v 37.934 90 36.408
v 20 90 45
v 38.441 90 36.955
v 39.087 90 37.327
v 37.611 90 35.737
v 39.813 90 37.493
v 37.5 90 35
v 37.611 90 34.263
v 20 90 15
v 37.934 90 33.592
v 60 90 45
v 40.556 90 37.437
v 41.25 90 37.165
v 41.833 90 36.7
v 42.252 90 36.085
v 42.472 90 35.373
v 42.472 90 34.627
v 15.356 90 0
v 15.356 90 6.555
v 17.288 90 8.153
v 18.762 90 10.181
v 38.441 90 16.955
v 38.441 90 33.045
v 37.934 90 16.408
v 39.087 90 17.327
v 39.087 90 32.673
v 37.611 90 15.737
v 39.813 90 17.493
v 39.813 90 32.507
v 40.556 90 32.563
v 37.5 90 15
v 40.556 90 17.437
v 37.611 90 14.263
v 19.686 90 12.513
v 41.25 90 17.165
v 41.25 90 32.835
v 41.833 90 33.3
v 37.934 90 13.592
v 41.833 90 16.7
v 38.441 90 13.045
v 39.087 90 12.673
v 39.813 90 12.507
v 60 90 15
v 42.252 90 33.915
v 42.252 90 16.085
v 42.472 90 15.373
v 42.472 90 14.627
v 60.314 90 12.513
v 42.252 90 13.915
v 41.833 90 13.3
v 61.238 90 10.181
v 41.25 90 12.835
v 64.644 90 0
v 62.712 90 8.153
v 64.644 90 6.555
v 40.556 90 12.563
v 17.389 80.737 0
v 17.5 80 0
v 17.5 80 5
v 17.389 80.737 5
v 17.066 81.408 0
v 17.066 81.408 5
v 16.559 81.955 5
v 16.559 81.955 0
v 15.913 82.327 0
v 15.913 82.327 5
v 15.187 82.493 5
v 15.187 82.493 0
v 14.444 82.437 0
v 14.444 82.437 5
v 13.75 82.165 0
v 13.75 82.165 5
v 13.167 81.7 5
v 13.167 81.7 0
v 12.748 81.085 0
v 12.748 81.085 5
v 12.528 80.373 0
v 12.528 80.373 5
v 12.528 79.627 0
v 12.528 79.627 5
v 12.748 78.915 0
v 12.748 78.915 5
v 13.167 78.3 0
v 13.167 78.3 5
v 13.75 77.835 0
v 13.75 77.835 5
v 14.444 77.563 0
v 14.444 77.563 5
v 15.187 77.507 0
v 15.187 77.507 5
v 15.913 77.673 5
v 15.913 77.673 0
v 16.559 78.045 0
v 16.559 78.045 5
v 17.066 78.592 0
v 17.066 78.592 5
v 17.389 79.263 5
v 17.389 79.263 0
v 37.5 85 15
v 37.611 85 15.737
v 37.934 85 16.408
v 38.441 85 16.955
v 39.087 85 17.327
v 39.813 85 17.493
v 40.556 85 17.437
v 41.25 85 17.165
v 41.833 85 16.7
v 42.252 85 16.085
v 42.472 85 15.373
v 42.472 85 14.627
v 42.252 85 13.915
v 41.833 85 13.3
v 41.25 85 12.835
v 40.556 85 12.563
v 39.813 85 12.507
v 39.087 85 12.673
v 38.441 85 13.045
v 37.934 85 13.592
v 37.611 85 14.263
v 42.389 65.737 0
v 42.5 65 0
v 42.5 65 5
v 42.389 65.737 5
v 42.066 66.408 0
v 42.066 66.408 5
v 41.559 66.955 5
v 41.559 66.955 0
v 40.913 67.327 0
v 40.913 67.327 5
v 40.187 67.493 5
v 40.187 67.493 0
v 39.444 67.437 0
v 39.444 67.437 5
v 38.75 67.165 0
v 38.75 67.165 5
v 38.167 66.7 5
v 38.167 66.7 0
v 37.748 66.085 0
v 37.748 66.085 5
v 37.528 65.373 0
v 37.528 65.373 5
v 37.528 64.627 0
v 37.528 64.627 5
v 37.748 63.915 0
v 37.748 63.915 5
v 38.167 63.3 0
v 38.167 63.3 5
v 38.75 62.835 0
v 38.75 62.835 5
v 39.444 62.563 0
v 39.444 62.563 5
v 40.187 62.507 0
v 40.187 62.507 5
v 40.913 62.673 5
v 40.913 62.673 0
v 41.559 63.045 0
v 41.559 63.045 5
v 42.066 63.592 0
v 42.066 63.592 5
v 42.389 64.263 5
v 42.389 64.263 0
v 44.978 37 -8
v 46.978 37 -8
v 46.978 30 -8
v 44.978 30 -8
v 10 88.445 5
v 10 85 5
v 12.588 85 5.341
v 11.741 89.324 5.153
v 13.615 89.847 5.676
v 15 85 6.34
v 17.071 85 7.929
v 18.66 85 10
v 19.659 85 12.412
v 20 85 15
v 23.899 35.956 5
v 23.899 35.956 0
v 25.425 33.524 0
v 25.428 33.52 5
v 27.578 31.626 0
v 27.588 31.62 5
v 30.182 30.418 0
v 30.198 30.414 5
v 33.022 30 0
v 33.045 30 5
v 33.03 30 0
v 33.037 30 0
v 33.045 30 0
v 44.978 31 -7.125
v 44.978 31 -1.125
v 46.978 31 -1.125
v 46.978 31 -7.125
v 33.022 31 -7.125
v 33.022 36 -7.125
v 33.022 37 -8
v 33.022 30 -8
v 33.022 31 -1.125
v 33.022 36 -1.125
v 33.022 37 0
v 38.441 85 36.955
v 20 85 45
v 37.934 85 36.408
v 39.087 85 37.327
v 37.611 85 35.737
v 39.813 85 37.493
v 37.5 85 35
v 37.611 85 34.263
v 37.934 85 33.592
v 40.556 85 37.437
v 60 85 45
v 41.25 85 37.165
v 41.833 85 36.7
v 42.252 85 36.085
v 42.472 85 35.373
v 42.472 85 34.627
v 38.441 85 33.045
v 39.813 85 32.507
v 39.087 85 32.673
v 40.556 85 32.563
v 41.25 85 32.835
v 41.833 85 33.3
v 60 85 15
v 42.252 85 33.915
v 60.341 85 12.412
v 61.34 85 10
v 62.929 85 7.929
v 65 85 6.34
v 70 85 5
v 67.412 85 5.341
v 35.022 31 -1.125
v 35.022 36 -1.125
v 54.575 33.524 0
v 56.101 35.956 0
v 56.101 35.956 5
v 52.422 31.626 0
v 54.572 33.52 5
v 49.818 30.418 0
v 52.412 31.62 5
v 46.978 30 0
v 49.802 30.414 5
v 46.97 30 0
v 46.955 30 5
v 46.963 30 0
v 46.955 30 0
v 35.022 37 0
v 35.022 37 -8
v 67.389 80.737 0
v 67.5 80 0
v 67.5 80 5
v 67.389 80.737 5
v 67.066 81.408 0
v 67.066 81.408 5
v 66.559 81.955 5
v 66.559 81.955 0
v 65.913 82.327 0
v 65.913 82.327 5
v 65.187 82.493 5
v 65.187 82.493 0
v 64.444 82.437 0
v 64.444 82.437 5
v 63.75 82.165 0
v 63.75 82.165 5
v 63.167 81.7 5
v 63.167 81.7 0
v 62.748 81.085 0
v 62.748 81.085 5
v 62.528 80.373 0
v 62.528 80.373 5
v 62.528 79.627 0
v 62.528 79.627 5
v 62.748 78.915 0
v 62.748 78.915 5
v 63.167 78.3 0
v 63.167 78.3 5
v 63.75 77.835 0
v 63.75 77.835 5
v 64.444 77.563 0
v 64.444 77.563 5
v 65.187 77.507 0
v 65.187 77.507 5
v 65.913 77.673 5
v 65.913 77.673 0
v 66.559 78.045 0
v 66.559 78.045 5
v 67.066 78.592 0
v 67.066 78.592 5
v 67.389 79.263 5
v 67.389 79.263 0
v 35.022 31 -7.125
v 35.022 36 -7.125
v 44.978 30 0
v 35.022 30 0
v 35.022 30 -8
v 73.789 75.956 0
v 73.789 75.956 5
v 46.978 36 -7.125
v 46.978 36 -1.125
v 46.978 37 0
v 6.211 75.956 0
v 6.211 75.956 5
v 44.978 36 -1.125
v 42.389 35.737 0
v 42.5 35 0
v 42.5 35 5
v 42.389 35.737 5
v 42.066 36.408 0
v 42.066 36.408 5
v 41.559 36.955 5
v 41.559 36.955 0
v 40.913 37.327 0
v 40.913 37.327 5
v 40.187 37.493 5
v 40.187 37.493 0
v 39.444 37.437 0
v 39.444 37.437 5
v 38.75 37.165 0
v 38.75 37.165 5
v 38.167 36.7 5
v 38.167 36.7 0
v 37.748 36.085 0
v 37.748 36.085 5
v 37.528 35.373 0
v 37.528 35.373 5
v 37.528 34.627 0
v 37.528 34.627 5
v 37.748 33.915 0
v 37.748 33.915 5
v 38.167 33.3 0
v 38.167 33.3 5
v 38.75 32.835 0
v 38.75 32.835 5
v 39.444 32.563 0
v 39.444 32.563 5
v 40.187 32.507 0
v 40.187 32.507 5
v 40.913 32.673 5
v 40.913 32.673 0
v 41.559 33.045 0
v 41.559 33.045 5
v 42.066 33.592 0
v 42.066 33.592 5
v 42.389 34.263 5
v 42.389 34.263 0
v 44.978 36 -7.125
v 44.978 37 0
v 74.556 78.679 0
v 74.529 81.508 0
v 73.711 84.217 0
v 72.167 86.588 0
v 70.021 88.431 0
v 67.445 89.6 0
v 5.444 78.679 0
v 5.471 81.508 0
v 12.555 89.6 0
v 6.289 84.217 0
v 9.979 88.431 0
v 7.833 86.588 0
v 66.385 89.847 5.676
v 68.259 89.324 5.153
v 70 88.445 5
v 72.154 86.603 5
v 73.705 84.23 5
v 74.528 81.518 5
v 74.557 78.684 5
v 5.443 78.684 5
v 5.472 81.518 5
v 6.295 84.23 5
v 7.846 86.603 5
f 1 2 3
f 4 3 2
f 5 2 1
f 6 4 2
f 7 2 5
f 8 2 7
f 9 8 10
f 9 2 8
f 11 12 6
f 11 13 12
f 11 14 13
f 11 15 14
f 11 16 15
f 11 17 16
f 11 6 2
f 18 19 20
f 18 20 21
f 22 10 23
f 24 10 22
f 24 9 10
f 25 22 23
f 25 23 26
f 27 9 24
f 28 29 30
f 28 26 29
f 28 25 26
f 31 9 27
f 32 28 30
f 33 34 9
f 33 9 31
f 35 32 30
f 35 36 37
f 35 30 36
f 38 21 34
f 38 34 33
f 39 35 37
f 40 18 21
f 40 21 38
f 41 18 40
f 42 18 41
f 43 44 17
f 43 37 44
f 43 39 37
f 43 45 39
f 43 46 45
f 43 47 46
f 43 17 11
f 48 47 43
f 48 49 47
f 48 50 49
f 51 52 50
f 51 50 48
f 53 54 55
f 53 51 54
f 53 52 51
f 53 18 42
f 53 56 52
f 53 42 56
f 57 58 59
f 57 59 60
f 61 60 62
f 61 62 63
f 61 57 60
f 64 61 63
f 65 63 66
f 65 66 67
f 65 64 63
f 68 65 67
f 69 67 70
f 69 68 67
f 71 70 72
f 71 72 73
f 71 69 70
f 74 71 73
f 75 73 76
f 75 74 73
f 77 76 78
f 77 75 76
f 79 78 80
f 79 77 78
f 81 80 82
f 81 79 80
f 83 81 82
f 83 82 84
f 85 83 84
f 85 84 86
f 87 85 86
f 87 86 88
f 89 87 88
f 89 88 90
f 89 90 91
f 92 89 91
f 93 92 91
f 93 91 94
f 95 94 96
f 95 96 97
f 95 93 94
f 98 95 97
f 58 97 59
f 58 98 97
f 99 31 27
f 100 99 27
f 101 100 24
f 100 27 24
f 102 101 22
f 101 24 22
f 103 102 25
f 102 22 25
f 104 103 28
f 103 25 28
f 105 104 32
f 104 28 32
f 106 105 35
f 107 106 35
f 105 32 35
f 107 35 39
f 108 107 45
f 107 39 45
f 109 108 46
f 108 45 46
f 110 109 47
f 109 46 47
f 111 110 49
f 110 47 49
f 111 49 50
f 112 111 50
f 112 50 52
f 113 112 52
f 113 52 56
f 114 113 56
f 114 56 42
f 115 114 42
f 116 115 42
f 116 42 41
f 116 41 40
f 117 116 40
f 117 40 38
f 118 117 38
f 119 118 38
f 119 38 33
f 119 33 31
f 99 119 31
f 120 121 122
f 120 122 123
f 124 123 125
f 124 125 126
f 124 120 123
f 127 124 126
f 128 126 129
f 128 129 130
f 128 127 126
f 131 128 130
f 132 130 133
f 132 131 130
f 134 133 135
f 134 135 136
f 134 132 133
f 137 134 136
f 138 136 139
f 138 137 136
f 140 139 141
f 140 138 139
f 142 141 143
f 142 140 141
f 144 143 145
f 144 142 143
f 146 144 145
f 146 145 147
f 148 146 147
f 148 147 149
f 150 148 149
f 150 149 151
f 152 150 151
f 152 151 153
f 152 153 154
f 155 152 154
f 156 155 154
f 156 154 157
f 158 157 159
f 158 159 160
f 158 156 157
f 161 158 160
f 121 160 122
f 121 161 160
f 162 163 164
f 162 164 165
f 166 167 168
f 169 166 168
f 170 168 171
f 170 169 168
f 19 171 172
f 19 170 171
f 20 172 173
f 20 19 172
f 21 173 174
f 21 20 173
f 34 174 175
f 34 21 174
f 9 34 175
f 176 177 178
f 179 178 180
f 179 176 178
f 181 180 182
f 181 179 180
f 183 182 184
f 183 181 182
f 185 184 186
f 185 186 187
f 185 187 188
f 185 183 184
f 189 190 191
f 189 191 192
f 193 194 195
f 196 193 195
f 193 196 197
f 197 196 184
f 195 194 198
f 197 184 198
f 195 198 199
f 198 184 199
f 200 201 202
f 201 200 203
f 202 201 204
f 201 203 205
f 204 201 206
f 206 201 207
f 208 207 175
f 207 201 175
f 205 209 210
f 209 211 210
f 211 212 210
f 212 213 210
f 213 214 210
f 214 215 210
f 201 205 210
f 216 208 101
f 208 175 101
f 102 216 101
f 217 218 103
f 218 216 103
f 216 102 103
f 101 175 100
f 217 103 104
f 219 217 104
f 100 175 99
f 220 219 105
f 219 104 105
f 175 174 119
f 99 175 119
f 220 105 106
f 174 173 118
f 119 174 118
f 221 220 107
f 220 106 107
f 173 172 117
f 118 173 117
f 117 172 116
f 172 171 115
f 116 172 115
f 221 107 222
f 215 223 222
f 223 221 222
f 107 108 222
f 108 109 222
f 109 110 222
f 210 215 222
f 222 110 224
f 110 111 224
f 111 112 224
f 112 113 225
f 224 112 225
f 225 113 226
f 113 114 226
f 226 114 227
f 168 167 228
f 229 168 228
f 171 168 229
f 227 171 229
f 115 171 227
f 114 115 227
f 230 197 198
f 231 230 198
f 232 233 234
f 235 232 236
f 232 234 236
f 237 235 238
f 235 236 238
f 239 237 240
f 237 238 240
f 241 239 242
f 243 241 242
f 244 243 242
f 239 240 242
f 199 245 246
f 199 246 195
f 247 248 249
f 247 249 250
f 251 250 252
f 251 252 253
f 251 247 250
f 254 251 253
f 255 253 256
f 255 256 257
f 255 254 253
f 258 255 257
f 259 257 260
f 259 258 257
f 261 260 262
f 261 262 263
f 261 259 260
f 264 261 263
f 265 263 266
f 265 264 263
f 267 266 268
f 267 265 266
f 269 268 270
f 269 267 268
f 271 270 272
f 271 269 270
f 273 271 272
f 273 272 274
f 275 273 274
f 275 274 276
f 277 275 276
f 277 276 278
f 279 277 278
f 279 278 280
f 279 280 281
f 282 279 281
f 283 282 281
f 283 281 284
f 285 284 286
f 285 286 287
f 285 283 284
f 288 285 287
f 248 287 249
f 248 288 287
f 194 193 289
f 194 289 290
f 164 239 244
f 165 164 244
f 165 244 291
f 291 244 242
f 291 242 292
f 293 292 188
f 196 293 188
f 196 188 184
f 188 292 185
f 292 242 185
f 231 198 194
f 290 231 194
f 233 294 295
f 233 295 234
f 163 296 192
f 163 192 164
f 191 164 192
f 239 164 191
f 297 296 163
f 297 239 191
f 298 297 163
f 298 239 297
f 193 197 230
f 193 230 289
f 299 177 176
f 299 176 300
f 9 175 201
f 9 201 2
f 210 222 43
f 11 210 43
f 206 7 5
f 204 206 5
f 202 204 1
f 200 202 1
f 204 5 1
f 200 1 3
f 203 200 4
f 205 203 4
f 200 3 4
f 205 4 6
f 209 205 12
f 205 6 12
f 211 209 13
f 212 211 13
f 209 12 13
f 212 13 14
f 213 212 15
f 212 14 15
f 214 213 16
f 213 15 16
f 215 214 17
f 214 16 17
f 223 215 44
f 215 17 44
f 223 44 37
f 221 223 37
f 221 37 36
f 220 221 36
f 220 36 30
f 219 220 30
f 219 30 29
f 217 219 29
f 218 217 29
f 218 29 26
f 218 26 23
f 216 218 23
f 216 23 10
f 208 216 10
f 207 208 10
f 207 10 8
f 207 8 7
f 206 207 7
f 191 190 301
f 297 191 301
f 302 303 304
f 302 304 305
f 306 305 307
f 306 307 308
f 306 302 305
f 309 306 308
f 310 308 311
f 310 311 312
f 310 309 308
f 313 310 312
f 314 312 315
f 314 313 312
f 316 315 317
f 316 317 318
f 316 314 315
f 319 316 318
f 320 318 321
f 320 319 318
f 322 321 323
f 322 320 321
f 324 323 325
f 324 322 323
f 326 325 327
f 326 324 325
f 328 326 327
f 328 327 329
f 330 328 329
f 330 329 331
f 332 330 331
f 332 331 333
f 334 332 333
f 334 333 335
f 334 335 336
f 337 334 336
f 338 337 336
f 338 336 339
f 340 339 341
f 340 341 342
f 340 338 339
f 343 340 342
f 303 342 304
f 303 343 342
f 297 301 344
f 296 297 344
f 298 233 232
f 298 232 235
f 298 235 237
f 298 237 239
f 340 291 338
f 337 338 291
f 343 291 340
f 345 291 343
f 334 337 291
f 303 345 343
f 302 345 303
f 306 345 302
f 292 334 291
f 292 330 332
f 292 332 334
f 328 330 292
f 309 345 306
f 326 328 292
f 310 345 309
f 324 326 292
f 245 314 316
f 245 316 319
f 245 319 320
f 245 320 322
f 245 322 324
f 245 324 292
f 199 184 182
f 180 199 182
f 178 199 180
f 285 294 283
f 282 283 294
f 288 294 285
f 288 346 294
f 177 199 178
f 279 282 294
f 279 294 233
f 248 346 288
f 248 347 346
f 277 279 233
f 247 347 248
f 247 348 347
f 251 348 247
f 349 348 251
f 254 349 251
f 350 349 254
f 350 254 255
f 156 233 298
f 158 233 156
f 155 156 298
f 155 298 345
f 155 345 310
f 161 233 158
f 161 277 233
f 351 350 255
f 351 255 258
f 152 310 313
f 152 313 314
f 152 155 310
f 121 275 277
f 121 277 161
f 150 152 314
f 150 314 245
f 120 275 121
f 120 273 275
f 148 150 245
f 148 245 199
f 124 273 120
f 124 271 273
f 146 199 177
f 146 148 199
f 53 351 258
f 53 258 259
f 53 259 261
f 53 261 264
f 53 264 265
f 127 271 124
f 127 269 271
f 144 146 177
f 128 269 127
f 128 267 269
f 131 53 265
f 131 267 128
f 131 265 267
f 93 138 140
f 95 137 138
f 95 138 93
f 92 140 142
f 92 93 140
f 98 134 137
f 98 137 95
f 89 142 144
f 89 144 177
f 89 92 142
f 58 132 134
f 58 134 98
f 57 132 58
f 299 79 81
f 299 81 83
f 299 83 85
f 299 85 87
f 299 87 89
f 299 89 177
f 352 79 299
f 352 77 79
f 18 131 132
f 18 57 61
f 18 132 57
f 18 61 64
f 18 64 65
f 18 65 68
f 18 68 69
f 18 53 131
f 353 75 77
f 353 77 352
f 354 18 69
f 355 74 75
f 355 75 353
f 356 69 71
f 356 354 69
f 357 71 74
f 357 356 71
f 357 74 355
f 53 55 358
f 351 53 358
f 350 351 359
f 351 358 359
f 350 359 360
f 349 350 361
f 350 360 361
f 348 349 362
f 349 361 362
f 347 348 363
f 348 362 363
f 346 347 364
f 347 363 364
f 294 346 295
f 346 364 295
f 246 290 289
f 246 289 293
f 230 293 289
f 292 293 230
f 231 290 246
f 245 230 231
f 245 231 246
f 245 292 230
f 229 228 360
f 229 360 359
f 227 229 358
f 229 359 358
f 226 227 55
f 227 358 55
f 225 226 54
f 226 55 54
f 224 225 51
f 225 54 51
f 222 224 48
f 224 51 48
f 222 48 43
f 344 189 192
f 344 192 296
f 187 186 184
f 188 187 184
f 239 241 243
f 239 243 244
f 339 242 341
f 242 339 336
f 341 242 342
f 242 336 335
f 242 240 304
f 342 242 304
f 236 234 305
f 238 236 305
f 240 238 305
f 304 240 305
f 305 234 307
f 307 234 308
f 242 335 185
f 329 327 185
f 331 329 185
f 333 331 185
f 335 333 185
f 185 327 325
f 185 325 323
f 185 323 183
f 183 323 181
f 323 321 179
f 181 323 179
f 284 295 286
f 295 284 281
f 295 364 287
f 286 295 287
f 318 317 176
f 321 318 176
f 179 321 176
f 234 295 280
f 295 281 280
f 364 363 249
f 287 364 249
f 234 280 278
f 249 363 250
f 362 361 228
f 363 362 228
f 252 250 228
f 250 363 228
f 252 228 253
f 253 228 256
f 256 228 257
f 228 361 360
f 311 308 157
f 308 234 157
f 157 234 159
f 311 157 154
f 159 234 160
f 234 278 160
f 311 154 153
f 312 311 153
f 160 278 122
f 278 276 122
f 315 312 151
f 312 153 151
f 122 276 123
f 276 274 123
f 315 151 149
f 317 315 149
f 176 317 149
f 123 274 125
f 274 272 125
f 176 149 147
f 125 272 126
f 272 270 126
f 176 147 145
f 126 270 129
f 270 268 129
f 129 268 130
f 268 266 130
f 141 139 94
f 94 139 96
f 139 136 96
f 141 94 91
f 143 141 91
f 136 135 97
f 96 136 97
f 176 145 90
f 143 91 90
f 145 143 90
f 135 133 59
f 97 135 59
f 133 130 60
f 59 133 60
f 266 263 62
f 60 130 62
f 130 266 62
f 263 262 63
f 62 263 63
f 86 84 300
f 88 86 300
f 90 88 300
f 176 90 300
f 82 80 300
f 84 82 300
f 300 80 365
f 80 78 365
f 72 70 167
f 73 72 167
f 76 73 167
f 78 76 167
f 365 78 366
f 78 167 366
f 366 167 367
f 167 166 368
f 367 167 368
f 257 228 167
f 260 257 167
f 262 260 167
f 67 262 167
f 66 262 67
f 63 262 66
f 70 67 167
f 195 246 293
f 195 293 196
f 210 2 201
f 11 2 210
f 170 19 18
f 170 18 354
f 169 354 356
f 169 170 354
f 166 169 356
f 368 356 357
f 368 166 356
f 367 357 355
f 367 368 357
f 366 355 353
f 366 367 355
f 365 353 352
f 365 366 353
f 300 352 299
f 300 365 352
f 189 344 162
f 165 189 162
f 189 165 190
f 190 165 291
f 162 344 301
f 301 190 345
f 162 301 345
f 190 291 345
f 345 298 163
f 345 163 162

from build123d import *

# Parameters (mm, degrees)
SKETCH1_R               = 2.5
BOSS_EXTRUDE1_DEPTH     = 5
FILLET1_R               = 10
SKETCH2_W               = 40
SKETCH2_H               = 5
BOSS_EXTRUDE2_DEPTH     = 40
SKETCH3_R               = 2.5
CUT_EXTRUDE1_DEPTH      = 106.814430788
FILLET3_R               = 10
SKETCH4_W               = 2
SKETCH4_H               = 7
BOSS_EXTRUDE3_DEPTH     = 8
CUT_EXTRUDE2_DEPTH      = 109.89140498
CUT_EXTRUDE2_DEPTH_BACK = 109.89140498
SKETCH5_W               = 6
SKETCH5_H               = 5


with BuildPart() as part:
    # Sketch1 → Boss-Extrude1 (new body)
    with BuildSketch(Plane.XY):
        Polygon((0, 90), (80, 90), (53.46739399, 30), (26.53260601, 30), align=None)
        with Locations((15, 80)):
            Circle(SKETCH1_R, mode=Mode.SUBTRACT)
        with Locations((65, 80)):
            Circle(SKETCH1_R, mode=Mode.SUBTRACT)
        with Locations((40, 35)):
            Circle(SKETCH1_R, mode=Mode.SUBTRACT)
        with Locations((40, 65)):
            Circle(SKETCH1_R, mode=Mode.SUBTRACT)
    extrude(amount=BOSS_EXTRUDE1_DEPTH)

    # Fillet1
    fillet1_edges = [part.edges().sort_by_distance(p)[0] for p in [
        (0, 90, 2.5),
        (80, 90, 2.5),
        (53.46739399, 30, 2.5),
        (26.53260601, 30, 2.5),
    ]]
    fillet(fillet1_edges, radius=FILLET1_R)

    # Sketch2 → Boss-Extrude2 (add)
    with BuildSketch(Plane.XY.offset(5)):
        with Locations((40, 87.5)):
            Rectangle(SKETCH2_W, SKETCH2_H)
    extrude(amount=BOSS_EXTRUDE2_DEPTH)

    # Sketch3 → Cut-Extrude1 (cut, through all)
    with BuildSketch(Plane(origin=(0, 90, 0), x_dir=(1, 0, 0), z_dir=(0, 1, 0))):
        with Locations(Location((40, -15, 0), (0, 0, 180))):
            Circle(SKETCH3_R)
        with Locations(Location((40, -35, 0), (0, 0, 180))):
            Circle(SKETCH3_R)
    extrude(amount=-CUT_EXTRUDE1_DEPTH, mode=Mode.SUBTRACT)

    # Fillet3
    fillet3_edges = [part.edges().sort_by_distance(p)[0] for p in [
        (60, 87.5, 5),
        (20, 87.5, 5),
    ]]
    fillet(fillet3_edges, radius=FILLET3_R)

    # Sketch4 → Boss-Extrude3 (add)
    with BuildSketch(Plane(origin=(0, 0, 0), x_dir=(-1, 0, 0), z_dir=(0, 0, -1))):
        with Locations((-34.022413797, 33.5)):
            Rectangle(SKETCH4_W, SKETCH4_H)
        with Locations((-45.977586203, 33.5)):
            Rectangle(SKETCH4_W, SKETCH4_H)
    extrude(amount=BOSS_EXTRUDE3_DEPTH)

    # Sketch5 → Cut-Extrude2 (cut, two sides: drawn at the far end of the back side and taken through both)
    with BuildSketch(Plane(origin=(46.977586203, 0, 0), x_dir=(0, 0, -1), z_dir=(1, 0, 0)).offset(-CUT_EXTRUDE2_DEPTH_BACK)):
        with Locations((4.124970421, 33.5)):
            Rectangle(SKETCH5_W, SKETCH5_H)
    extrude(amount=CUT_EXTRUDE2_DEPTH + CUT_EXTRUDE2_DEPTH_BACK, mode=Mode.SUBTRACT)


solid = part.part
